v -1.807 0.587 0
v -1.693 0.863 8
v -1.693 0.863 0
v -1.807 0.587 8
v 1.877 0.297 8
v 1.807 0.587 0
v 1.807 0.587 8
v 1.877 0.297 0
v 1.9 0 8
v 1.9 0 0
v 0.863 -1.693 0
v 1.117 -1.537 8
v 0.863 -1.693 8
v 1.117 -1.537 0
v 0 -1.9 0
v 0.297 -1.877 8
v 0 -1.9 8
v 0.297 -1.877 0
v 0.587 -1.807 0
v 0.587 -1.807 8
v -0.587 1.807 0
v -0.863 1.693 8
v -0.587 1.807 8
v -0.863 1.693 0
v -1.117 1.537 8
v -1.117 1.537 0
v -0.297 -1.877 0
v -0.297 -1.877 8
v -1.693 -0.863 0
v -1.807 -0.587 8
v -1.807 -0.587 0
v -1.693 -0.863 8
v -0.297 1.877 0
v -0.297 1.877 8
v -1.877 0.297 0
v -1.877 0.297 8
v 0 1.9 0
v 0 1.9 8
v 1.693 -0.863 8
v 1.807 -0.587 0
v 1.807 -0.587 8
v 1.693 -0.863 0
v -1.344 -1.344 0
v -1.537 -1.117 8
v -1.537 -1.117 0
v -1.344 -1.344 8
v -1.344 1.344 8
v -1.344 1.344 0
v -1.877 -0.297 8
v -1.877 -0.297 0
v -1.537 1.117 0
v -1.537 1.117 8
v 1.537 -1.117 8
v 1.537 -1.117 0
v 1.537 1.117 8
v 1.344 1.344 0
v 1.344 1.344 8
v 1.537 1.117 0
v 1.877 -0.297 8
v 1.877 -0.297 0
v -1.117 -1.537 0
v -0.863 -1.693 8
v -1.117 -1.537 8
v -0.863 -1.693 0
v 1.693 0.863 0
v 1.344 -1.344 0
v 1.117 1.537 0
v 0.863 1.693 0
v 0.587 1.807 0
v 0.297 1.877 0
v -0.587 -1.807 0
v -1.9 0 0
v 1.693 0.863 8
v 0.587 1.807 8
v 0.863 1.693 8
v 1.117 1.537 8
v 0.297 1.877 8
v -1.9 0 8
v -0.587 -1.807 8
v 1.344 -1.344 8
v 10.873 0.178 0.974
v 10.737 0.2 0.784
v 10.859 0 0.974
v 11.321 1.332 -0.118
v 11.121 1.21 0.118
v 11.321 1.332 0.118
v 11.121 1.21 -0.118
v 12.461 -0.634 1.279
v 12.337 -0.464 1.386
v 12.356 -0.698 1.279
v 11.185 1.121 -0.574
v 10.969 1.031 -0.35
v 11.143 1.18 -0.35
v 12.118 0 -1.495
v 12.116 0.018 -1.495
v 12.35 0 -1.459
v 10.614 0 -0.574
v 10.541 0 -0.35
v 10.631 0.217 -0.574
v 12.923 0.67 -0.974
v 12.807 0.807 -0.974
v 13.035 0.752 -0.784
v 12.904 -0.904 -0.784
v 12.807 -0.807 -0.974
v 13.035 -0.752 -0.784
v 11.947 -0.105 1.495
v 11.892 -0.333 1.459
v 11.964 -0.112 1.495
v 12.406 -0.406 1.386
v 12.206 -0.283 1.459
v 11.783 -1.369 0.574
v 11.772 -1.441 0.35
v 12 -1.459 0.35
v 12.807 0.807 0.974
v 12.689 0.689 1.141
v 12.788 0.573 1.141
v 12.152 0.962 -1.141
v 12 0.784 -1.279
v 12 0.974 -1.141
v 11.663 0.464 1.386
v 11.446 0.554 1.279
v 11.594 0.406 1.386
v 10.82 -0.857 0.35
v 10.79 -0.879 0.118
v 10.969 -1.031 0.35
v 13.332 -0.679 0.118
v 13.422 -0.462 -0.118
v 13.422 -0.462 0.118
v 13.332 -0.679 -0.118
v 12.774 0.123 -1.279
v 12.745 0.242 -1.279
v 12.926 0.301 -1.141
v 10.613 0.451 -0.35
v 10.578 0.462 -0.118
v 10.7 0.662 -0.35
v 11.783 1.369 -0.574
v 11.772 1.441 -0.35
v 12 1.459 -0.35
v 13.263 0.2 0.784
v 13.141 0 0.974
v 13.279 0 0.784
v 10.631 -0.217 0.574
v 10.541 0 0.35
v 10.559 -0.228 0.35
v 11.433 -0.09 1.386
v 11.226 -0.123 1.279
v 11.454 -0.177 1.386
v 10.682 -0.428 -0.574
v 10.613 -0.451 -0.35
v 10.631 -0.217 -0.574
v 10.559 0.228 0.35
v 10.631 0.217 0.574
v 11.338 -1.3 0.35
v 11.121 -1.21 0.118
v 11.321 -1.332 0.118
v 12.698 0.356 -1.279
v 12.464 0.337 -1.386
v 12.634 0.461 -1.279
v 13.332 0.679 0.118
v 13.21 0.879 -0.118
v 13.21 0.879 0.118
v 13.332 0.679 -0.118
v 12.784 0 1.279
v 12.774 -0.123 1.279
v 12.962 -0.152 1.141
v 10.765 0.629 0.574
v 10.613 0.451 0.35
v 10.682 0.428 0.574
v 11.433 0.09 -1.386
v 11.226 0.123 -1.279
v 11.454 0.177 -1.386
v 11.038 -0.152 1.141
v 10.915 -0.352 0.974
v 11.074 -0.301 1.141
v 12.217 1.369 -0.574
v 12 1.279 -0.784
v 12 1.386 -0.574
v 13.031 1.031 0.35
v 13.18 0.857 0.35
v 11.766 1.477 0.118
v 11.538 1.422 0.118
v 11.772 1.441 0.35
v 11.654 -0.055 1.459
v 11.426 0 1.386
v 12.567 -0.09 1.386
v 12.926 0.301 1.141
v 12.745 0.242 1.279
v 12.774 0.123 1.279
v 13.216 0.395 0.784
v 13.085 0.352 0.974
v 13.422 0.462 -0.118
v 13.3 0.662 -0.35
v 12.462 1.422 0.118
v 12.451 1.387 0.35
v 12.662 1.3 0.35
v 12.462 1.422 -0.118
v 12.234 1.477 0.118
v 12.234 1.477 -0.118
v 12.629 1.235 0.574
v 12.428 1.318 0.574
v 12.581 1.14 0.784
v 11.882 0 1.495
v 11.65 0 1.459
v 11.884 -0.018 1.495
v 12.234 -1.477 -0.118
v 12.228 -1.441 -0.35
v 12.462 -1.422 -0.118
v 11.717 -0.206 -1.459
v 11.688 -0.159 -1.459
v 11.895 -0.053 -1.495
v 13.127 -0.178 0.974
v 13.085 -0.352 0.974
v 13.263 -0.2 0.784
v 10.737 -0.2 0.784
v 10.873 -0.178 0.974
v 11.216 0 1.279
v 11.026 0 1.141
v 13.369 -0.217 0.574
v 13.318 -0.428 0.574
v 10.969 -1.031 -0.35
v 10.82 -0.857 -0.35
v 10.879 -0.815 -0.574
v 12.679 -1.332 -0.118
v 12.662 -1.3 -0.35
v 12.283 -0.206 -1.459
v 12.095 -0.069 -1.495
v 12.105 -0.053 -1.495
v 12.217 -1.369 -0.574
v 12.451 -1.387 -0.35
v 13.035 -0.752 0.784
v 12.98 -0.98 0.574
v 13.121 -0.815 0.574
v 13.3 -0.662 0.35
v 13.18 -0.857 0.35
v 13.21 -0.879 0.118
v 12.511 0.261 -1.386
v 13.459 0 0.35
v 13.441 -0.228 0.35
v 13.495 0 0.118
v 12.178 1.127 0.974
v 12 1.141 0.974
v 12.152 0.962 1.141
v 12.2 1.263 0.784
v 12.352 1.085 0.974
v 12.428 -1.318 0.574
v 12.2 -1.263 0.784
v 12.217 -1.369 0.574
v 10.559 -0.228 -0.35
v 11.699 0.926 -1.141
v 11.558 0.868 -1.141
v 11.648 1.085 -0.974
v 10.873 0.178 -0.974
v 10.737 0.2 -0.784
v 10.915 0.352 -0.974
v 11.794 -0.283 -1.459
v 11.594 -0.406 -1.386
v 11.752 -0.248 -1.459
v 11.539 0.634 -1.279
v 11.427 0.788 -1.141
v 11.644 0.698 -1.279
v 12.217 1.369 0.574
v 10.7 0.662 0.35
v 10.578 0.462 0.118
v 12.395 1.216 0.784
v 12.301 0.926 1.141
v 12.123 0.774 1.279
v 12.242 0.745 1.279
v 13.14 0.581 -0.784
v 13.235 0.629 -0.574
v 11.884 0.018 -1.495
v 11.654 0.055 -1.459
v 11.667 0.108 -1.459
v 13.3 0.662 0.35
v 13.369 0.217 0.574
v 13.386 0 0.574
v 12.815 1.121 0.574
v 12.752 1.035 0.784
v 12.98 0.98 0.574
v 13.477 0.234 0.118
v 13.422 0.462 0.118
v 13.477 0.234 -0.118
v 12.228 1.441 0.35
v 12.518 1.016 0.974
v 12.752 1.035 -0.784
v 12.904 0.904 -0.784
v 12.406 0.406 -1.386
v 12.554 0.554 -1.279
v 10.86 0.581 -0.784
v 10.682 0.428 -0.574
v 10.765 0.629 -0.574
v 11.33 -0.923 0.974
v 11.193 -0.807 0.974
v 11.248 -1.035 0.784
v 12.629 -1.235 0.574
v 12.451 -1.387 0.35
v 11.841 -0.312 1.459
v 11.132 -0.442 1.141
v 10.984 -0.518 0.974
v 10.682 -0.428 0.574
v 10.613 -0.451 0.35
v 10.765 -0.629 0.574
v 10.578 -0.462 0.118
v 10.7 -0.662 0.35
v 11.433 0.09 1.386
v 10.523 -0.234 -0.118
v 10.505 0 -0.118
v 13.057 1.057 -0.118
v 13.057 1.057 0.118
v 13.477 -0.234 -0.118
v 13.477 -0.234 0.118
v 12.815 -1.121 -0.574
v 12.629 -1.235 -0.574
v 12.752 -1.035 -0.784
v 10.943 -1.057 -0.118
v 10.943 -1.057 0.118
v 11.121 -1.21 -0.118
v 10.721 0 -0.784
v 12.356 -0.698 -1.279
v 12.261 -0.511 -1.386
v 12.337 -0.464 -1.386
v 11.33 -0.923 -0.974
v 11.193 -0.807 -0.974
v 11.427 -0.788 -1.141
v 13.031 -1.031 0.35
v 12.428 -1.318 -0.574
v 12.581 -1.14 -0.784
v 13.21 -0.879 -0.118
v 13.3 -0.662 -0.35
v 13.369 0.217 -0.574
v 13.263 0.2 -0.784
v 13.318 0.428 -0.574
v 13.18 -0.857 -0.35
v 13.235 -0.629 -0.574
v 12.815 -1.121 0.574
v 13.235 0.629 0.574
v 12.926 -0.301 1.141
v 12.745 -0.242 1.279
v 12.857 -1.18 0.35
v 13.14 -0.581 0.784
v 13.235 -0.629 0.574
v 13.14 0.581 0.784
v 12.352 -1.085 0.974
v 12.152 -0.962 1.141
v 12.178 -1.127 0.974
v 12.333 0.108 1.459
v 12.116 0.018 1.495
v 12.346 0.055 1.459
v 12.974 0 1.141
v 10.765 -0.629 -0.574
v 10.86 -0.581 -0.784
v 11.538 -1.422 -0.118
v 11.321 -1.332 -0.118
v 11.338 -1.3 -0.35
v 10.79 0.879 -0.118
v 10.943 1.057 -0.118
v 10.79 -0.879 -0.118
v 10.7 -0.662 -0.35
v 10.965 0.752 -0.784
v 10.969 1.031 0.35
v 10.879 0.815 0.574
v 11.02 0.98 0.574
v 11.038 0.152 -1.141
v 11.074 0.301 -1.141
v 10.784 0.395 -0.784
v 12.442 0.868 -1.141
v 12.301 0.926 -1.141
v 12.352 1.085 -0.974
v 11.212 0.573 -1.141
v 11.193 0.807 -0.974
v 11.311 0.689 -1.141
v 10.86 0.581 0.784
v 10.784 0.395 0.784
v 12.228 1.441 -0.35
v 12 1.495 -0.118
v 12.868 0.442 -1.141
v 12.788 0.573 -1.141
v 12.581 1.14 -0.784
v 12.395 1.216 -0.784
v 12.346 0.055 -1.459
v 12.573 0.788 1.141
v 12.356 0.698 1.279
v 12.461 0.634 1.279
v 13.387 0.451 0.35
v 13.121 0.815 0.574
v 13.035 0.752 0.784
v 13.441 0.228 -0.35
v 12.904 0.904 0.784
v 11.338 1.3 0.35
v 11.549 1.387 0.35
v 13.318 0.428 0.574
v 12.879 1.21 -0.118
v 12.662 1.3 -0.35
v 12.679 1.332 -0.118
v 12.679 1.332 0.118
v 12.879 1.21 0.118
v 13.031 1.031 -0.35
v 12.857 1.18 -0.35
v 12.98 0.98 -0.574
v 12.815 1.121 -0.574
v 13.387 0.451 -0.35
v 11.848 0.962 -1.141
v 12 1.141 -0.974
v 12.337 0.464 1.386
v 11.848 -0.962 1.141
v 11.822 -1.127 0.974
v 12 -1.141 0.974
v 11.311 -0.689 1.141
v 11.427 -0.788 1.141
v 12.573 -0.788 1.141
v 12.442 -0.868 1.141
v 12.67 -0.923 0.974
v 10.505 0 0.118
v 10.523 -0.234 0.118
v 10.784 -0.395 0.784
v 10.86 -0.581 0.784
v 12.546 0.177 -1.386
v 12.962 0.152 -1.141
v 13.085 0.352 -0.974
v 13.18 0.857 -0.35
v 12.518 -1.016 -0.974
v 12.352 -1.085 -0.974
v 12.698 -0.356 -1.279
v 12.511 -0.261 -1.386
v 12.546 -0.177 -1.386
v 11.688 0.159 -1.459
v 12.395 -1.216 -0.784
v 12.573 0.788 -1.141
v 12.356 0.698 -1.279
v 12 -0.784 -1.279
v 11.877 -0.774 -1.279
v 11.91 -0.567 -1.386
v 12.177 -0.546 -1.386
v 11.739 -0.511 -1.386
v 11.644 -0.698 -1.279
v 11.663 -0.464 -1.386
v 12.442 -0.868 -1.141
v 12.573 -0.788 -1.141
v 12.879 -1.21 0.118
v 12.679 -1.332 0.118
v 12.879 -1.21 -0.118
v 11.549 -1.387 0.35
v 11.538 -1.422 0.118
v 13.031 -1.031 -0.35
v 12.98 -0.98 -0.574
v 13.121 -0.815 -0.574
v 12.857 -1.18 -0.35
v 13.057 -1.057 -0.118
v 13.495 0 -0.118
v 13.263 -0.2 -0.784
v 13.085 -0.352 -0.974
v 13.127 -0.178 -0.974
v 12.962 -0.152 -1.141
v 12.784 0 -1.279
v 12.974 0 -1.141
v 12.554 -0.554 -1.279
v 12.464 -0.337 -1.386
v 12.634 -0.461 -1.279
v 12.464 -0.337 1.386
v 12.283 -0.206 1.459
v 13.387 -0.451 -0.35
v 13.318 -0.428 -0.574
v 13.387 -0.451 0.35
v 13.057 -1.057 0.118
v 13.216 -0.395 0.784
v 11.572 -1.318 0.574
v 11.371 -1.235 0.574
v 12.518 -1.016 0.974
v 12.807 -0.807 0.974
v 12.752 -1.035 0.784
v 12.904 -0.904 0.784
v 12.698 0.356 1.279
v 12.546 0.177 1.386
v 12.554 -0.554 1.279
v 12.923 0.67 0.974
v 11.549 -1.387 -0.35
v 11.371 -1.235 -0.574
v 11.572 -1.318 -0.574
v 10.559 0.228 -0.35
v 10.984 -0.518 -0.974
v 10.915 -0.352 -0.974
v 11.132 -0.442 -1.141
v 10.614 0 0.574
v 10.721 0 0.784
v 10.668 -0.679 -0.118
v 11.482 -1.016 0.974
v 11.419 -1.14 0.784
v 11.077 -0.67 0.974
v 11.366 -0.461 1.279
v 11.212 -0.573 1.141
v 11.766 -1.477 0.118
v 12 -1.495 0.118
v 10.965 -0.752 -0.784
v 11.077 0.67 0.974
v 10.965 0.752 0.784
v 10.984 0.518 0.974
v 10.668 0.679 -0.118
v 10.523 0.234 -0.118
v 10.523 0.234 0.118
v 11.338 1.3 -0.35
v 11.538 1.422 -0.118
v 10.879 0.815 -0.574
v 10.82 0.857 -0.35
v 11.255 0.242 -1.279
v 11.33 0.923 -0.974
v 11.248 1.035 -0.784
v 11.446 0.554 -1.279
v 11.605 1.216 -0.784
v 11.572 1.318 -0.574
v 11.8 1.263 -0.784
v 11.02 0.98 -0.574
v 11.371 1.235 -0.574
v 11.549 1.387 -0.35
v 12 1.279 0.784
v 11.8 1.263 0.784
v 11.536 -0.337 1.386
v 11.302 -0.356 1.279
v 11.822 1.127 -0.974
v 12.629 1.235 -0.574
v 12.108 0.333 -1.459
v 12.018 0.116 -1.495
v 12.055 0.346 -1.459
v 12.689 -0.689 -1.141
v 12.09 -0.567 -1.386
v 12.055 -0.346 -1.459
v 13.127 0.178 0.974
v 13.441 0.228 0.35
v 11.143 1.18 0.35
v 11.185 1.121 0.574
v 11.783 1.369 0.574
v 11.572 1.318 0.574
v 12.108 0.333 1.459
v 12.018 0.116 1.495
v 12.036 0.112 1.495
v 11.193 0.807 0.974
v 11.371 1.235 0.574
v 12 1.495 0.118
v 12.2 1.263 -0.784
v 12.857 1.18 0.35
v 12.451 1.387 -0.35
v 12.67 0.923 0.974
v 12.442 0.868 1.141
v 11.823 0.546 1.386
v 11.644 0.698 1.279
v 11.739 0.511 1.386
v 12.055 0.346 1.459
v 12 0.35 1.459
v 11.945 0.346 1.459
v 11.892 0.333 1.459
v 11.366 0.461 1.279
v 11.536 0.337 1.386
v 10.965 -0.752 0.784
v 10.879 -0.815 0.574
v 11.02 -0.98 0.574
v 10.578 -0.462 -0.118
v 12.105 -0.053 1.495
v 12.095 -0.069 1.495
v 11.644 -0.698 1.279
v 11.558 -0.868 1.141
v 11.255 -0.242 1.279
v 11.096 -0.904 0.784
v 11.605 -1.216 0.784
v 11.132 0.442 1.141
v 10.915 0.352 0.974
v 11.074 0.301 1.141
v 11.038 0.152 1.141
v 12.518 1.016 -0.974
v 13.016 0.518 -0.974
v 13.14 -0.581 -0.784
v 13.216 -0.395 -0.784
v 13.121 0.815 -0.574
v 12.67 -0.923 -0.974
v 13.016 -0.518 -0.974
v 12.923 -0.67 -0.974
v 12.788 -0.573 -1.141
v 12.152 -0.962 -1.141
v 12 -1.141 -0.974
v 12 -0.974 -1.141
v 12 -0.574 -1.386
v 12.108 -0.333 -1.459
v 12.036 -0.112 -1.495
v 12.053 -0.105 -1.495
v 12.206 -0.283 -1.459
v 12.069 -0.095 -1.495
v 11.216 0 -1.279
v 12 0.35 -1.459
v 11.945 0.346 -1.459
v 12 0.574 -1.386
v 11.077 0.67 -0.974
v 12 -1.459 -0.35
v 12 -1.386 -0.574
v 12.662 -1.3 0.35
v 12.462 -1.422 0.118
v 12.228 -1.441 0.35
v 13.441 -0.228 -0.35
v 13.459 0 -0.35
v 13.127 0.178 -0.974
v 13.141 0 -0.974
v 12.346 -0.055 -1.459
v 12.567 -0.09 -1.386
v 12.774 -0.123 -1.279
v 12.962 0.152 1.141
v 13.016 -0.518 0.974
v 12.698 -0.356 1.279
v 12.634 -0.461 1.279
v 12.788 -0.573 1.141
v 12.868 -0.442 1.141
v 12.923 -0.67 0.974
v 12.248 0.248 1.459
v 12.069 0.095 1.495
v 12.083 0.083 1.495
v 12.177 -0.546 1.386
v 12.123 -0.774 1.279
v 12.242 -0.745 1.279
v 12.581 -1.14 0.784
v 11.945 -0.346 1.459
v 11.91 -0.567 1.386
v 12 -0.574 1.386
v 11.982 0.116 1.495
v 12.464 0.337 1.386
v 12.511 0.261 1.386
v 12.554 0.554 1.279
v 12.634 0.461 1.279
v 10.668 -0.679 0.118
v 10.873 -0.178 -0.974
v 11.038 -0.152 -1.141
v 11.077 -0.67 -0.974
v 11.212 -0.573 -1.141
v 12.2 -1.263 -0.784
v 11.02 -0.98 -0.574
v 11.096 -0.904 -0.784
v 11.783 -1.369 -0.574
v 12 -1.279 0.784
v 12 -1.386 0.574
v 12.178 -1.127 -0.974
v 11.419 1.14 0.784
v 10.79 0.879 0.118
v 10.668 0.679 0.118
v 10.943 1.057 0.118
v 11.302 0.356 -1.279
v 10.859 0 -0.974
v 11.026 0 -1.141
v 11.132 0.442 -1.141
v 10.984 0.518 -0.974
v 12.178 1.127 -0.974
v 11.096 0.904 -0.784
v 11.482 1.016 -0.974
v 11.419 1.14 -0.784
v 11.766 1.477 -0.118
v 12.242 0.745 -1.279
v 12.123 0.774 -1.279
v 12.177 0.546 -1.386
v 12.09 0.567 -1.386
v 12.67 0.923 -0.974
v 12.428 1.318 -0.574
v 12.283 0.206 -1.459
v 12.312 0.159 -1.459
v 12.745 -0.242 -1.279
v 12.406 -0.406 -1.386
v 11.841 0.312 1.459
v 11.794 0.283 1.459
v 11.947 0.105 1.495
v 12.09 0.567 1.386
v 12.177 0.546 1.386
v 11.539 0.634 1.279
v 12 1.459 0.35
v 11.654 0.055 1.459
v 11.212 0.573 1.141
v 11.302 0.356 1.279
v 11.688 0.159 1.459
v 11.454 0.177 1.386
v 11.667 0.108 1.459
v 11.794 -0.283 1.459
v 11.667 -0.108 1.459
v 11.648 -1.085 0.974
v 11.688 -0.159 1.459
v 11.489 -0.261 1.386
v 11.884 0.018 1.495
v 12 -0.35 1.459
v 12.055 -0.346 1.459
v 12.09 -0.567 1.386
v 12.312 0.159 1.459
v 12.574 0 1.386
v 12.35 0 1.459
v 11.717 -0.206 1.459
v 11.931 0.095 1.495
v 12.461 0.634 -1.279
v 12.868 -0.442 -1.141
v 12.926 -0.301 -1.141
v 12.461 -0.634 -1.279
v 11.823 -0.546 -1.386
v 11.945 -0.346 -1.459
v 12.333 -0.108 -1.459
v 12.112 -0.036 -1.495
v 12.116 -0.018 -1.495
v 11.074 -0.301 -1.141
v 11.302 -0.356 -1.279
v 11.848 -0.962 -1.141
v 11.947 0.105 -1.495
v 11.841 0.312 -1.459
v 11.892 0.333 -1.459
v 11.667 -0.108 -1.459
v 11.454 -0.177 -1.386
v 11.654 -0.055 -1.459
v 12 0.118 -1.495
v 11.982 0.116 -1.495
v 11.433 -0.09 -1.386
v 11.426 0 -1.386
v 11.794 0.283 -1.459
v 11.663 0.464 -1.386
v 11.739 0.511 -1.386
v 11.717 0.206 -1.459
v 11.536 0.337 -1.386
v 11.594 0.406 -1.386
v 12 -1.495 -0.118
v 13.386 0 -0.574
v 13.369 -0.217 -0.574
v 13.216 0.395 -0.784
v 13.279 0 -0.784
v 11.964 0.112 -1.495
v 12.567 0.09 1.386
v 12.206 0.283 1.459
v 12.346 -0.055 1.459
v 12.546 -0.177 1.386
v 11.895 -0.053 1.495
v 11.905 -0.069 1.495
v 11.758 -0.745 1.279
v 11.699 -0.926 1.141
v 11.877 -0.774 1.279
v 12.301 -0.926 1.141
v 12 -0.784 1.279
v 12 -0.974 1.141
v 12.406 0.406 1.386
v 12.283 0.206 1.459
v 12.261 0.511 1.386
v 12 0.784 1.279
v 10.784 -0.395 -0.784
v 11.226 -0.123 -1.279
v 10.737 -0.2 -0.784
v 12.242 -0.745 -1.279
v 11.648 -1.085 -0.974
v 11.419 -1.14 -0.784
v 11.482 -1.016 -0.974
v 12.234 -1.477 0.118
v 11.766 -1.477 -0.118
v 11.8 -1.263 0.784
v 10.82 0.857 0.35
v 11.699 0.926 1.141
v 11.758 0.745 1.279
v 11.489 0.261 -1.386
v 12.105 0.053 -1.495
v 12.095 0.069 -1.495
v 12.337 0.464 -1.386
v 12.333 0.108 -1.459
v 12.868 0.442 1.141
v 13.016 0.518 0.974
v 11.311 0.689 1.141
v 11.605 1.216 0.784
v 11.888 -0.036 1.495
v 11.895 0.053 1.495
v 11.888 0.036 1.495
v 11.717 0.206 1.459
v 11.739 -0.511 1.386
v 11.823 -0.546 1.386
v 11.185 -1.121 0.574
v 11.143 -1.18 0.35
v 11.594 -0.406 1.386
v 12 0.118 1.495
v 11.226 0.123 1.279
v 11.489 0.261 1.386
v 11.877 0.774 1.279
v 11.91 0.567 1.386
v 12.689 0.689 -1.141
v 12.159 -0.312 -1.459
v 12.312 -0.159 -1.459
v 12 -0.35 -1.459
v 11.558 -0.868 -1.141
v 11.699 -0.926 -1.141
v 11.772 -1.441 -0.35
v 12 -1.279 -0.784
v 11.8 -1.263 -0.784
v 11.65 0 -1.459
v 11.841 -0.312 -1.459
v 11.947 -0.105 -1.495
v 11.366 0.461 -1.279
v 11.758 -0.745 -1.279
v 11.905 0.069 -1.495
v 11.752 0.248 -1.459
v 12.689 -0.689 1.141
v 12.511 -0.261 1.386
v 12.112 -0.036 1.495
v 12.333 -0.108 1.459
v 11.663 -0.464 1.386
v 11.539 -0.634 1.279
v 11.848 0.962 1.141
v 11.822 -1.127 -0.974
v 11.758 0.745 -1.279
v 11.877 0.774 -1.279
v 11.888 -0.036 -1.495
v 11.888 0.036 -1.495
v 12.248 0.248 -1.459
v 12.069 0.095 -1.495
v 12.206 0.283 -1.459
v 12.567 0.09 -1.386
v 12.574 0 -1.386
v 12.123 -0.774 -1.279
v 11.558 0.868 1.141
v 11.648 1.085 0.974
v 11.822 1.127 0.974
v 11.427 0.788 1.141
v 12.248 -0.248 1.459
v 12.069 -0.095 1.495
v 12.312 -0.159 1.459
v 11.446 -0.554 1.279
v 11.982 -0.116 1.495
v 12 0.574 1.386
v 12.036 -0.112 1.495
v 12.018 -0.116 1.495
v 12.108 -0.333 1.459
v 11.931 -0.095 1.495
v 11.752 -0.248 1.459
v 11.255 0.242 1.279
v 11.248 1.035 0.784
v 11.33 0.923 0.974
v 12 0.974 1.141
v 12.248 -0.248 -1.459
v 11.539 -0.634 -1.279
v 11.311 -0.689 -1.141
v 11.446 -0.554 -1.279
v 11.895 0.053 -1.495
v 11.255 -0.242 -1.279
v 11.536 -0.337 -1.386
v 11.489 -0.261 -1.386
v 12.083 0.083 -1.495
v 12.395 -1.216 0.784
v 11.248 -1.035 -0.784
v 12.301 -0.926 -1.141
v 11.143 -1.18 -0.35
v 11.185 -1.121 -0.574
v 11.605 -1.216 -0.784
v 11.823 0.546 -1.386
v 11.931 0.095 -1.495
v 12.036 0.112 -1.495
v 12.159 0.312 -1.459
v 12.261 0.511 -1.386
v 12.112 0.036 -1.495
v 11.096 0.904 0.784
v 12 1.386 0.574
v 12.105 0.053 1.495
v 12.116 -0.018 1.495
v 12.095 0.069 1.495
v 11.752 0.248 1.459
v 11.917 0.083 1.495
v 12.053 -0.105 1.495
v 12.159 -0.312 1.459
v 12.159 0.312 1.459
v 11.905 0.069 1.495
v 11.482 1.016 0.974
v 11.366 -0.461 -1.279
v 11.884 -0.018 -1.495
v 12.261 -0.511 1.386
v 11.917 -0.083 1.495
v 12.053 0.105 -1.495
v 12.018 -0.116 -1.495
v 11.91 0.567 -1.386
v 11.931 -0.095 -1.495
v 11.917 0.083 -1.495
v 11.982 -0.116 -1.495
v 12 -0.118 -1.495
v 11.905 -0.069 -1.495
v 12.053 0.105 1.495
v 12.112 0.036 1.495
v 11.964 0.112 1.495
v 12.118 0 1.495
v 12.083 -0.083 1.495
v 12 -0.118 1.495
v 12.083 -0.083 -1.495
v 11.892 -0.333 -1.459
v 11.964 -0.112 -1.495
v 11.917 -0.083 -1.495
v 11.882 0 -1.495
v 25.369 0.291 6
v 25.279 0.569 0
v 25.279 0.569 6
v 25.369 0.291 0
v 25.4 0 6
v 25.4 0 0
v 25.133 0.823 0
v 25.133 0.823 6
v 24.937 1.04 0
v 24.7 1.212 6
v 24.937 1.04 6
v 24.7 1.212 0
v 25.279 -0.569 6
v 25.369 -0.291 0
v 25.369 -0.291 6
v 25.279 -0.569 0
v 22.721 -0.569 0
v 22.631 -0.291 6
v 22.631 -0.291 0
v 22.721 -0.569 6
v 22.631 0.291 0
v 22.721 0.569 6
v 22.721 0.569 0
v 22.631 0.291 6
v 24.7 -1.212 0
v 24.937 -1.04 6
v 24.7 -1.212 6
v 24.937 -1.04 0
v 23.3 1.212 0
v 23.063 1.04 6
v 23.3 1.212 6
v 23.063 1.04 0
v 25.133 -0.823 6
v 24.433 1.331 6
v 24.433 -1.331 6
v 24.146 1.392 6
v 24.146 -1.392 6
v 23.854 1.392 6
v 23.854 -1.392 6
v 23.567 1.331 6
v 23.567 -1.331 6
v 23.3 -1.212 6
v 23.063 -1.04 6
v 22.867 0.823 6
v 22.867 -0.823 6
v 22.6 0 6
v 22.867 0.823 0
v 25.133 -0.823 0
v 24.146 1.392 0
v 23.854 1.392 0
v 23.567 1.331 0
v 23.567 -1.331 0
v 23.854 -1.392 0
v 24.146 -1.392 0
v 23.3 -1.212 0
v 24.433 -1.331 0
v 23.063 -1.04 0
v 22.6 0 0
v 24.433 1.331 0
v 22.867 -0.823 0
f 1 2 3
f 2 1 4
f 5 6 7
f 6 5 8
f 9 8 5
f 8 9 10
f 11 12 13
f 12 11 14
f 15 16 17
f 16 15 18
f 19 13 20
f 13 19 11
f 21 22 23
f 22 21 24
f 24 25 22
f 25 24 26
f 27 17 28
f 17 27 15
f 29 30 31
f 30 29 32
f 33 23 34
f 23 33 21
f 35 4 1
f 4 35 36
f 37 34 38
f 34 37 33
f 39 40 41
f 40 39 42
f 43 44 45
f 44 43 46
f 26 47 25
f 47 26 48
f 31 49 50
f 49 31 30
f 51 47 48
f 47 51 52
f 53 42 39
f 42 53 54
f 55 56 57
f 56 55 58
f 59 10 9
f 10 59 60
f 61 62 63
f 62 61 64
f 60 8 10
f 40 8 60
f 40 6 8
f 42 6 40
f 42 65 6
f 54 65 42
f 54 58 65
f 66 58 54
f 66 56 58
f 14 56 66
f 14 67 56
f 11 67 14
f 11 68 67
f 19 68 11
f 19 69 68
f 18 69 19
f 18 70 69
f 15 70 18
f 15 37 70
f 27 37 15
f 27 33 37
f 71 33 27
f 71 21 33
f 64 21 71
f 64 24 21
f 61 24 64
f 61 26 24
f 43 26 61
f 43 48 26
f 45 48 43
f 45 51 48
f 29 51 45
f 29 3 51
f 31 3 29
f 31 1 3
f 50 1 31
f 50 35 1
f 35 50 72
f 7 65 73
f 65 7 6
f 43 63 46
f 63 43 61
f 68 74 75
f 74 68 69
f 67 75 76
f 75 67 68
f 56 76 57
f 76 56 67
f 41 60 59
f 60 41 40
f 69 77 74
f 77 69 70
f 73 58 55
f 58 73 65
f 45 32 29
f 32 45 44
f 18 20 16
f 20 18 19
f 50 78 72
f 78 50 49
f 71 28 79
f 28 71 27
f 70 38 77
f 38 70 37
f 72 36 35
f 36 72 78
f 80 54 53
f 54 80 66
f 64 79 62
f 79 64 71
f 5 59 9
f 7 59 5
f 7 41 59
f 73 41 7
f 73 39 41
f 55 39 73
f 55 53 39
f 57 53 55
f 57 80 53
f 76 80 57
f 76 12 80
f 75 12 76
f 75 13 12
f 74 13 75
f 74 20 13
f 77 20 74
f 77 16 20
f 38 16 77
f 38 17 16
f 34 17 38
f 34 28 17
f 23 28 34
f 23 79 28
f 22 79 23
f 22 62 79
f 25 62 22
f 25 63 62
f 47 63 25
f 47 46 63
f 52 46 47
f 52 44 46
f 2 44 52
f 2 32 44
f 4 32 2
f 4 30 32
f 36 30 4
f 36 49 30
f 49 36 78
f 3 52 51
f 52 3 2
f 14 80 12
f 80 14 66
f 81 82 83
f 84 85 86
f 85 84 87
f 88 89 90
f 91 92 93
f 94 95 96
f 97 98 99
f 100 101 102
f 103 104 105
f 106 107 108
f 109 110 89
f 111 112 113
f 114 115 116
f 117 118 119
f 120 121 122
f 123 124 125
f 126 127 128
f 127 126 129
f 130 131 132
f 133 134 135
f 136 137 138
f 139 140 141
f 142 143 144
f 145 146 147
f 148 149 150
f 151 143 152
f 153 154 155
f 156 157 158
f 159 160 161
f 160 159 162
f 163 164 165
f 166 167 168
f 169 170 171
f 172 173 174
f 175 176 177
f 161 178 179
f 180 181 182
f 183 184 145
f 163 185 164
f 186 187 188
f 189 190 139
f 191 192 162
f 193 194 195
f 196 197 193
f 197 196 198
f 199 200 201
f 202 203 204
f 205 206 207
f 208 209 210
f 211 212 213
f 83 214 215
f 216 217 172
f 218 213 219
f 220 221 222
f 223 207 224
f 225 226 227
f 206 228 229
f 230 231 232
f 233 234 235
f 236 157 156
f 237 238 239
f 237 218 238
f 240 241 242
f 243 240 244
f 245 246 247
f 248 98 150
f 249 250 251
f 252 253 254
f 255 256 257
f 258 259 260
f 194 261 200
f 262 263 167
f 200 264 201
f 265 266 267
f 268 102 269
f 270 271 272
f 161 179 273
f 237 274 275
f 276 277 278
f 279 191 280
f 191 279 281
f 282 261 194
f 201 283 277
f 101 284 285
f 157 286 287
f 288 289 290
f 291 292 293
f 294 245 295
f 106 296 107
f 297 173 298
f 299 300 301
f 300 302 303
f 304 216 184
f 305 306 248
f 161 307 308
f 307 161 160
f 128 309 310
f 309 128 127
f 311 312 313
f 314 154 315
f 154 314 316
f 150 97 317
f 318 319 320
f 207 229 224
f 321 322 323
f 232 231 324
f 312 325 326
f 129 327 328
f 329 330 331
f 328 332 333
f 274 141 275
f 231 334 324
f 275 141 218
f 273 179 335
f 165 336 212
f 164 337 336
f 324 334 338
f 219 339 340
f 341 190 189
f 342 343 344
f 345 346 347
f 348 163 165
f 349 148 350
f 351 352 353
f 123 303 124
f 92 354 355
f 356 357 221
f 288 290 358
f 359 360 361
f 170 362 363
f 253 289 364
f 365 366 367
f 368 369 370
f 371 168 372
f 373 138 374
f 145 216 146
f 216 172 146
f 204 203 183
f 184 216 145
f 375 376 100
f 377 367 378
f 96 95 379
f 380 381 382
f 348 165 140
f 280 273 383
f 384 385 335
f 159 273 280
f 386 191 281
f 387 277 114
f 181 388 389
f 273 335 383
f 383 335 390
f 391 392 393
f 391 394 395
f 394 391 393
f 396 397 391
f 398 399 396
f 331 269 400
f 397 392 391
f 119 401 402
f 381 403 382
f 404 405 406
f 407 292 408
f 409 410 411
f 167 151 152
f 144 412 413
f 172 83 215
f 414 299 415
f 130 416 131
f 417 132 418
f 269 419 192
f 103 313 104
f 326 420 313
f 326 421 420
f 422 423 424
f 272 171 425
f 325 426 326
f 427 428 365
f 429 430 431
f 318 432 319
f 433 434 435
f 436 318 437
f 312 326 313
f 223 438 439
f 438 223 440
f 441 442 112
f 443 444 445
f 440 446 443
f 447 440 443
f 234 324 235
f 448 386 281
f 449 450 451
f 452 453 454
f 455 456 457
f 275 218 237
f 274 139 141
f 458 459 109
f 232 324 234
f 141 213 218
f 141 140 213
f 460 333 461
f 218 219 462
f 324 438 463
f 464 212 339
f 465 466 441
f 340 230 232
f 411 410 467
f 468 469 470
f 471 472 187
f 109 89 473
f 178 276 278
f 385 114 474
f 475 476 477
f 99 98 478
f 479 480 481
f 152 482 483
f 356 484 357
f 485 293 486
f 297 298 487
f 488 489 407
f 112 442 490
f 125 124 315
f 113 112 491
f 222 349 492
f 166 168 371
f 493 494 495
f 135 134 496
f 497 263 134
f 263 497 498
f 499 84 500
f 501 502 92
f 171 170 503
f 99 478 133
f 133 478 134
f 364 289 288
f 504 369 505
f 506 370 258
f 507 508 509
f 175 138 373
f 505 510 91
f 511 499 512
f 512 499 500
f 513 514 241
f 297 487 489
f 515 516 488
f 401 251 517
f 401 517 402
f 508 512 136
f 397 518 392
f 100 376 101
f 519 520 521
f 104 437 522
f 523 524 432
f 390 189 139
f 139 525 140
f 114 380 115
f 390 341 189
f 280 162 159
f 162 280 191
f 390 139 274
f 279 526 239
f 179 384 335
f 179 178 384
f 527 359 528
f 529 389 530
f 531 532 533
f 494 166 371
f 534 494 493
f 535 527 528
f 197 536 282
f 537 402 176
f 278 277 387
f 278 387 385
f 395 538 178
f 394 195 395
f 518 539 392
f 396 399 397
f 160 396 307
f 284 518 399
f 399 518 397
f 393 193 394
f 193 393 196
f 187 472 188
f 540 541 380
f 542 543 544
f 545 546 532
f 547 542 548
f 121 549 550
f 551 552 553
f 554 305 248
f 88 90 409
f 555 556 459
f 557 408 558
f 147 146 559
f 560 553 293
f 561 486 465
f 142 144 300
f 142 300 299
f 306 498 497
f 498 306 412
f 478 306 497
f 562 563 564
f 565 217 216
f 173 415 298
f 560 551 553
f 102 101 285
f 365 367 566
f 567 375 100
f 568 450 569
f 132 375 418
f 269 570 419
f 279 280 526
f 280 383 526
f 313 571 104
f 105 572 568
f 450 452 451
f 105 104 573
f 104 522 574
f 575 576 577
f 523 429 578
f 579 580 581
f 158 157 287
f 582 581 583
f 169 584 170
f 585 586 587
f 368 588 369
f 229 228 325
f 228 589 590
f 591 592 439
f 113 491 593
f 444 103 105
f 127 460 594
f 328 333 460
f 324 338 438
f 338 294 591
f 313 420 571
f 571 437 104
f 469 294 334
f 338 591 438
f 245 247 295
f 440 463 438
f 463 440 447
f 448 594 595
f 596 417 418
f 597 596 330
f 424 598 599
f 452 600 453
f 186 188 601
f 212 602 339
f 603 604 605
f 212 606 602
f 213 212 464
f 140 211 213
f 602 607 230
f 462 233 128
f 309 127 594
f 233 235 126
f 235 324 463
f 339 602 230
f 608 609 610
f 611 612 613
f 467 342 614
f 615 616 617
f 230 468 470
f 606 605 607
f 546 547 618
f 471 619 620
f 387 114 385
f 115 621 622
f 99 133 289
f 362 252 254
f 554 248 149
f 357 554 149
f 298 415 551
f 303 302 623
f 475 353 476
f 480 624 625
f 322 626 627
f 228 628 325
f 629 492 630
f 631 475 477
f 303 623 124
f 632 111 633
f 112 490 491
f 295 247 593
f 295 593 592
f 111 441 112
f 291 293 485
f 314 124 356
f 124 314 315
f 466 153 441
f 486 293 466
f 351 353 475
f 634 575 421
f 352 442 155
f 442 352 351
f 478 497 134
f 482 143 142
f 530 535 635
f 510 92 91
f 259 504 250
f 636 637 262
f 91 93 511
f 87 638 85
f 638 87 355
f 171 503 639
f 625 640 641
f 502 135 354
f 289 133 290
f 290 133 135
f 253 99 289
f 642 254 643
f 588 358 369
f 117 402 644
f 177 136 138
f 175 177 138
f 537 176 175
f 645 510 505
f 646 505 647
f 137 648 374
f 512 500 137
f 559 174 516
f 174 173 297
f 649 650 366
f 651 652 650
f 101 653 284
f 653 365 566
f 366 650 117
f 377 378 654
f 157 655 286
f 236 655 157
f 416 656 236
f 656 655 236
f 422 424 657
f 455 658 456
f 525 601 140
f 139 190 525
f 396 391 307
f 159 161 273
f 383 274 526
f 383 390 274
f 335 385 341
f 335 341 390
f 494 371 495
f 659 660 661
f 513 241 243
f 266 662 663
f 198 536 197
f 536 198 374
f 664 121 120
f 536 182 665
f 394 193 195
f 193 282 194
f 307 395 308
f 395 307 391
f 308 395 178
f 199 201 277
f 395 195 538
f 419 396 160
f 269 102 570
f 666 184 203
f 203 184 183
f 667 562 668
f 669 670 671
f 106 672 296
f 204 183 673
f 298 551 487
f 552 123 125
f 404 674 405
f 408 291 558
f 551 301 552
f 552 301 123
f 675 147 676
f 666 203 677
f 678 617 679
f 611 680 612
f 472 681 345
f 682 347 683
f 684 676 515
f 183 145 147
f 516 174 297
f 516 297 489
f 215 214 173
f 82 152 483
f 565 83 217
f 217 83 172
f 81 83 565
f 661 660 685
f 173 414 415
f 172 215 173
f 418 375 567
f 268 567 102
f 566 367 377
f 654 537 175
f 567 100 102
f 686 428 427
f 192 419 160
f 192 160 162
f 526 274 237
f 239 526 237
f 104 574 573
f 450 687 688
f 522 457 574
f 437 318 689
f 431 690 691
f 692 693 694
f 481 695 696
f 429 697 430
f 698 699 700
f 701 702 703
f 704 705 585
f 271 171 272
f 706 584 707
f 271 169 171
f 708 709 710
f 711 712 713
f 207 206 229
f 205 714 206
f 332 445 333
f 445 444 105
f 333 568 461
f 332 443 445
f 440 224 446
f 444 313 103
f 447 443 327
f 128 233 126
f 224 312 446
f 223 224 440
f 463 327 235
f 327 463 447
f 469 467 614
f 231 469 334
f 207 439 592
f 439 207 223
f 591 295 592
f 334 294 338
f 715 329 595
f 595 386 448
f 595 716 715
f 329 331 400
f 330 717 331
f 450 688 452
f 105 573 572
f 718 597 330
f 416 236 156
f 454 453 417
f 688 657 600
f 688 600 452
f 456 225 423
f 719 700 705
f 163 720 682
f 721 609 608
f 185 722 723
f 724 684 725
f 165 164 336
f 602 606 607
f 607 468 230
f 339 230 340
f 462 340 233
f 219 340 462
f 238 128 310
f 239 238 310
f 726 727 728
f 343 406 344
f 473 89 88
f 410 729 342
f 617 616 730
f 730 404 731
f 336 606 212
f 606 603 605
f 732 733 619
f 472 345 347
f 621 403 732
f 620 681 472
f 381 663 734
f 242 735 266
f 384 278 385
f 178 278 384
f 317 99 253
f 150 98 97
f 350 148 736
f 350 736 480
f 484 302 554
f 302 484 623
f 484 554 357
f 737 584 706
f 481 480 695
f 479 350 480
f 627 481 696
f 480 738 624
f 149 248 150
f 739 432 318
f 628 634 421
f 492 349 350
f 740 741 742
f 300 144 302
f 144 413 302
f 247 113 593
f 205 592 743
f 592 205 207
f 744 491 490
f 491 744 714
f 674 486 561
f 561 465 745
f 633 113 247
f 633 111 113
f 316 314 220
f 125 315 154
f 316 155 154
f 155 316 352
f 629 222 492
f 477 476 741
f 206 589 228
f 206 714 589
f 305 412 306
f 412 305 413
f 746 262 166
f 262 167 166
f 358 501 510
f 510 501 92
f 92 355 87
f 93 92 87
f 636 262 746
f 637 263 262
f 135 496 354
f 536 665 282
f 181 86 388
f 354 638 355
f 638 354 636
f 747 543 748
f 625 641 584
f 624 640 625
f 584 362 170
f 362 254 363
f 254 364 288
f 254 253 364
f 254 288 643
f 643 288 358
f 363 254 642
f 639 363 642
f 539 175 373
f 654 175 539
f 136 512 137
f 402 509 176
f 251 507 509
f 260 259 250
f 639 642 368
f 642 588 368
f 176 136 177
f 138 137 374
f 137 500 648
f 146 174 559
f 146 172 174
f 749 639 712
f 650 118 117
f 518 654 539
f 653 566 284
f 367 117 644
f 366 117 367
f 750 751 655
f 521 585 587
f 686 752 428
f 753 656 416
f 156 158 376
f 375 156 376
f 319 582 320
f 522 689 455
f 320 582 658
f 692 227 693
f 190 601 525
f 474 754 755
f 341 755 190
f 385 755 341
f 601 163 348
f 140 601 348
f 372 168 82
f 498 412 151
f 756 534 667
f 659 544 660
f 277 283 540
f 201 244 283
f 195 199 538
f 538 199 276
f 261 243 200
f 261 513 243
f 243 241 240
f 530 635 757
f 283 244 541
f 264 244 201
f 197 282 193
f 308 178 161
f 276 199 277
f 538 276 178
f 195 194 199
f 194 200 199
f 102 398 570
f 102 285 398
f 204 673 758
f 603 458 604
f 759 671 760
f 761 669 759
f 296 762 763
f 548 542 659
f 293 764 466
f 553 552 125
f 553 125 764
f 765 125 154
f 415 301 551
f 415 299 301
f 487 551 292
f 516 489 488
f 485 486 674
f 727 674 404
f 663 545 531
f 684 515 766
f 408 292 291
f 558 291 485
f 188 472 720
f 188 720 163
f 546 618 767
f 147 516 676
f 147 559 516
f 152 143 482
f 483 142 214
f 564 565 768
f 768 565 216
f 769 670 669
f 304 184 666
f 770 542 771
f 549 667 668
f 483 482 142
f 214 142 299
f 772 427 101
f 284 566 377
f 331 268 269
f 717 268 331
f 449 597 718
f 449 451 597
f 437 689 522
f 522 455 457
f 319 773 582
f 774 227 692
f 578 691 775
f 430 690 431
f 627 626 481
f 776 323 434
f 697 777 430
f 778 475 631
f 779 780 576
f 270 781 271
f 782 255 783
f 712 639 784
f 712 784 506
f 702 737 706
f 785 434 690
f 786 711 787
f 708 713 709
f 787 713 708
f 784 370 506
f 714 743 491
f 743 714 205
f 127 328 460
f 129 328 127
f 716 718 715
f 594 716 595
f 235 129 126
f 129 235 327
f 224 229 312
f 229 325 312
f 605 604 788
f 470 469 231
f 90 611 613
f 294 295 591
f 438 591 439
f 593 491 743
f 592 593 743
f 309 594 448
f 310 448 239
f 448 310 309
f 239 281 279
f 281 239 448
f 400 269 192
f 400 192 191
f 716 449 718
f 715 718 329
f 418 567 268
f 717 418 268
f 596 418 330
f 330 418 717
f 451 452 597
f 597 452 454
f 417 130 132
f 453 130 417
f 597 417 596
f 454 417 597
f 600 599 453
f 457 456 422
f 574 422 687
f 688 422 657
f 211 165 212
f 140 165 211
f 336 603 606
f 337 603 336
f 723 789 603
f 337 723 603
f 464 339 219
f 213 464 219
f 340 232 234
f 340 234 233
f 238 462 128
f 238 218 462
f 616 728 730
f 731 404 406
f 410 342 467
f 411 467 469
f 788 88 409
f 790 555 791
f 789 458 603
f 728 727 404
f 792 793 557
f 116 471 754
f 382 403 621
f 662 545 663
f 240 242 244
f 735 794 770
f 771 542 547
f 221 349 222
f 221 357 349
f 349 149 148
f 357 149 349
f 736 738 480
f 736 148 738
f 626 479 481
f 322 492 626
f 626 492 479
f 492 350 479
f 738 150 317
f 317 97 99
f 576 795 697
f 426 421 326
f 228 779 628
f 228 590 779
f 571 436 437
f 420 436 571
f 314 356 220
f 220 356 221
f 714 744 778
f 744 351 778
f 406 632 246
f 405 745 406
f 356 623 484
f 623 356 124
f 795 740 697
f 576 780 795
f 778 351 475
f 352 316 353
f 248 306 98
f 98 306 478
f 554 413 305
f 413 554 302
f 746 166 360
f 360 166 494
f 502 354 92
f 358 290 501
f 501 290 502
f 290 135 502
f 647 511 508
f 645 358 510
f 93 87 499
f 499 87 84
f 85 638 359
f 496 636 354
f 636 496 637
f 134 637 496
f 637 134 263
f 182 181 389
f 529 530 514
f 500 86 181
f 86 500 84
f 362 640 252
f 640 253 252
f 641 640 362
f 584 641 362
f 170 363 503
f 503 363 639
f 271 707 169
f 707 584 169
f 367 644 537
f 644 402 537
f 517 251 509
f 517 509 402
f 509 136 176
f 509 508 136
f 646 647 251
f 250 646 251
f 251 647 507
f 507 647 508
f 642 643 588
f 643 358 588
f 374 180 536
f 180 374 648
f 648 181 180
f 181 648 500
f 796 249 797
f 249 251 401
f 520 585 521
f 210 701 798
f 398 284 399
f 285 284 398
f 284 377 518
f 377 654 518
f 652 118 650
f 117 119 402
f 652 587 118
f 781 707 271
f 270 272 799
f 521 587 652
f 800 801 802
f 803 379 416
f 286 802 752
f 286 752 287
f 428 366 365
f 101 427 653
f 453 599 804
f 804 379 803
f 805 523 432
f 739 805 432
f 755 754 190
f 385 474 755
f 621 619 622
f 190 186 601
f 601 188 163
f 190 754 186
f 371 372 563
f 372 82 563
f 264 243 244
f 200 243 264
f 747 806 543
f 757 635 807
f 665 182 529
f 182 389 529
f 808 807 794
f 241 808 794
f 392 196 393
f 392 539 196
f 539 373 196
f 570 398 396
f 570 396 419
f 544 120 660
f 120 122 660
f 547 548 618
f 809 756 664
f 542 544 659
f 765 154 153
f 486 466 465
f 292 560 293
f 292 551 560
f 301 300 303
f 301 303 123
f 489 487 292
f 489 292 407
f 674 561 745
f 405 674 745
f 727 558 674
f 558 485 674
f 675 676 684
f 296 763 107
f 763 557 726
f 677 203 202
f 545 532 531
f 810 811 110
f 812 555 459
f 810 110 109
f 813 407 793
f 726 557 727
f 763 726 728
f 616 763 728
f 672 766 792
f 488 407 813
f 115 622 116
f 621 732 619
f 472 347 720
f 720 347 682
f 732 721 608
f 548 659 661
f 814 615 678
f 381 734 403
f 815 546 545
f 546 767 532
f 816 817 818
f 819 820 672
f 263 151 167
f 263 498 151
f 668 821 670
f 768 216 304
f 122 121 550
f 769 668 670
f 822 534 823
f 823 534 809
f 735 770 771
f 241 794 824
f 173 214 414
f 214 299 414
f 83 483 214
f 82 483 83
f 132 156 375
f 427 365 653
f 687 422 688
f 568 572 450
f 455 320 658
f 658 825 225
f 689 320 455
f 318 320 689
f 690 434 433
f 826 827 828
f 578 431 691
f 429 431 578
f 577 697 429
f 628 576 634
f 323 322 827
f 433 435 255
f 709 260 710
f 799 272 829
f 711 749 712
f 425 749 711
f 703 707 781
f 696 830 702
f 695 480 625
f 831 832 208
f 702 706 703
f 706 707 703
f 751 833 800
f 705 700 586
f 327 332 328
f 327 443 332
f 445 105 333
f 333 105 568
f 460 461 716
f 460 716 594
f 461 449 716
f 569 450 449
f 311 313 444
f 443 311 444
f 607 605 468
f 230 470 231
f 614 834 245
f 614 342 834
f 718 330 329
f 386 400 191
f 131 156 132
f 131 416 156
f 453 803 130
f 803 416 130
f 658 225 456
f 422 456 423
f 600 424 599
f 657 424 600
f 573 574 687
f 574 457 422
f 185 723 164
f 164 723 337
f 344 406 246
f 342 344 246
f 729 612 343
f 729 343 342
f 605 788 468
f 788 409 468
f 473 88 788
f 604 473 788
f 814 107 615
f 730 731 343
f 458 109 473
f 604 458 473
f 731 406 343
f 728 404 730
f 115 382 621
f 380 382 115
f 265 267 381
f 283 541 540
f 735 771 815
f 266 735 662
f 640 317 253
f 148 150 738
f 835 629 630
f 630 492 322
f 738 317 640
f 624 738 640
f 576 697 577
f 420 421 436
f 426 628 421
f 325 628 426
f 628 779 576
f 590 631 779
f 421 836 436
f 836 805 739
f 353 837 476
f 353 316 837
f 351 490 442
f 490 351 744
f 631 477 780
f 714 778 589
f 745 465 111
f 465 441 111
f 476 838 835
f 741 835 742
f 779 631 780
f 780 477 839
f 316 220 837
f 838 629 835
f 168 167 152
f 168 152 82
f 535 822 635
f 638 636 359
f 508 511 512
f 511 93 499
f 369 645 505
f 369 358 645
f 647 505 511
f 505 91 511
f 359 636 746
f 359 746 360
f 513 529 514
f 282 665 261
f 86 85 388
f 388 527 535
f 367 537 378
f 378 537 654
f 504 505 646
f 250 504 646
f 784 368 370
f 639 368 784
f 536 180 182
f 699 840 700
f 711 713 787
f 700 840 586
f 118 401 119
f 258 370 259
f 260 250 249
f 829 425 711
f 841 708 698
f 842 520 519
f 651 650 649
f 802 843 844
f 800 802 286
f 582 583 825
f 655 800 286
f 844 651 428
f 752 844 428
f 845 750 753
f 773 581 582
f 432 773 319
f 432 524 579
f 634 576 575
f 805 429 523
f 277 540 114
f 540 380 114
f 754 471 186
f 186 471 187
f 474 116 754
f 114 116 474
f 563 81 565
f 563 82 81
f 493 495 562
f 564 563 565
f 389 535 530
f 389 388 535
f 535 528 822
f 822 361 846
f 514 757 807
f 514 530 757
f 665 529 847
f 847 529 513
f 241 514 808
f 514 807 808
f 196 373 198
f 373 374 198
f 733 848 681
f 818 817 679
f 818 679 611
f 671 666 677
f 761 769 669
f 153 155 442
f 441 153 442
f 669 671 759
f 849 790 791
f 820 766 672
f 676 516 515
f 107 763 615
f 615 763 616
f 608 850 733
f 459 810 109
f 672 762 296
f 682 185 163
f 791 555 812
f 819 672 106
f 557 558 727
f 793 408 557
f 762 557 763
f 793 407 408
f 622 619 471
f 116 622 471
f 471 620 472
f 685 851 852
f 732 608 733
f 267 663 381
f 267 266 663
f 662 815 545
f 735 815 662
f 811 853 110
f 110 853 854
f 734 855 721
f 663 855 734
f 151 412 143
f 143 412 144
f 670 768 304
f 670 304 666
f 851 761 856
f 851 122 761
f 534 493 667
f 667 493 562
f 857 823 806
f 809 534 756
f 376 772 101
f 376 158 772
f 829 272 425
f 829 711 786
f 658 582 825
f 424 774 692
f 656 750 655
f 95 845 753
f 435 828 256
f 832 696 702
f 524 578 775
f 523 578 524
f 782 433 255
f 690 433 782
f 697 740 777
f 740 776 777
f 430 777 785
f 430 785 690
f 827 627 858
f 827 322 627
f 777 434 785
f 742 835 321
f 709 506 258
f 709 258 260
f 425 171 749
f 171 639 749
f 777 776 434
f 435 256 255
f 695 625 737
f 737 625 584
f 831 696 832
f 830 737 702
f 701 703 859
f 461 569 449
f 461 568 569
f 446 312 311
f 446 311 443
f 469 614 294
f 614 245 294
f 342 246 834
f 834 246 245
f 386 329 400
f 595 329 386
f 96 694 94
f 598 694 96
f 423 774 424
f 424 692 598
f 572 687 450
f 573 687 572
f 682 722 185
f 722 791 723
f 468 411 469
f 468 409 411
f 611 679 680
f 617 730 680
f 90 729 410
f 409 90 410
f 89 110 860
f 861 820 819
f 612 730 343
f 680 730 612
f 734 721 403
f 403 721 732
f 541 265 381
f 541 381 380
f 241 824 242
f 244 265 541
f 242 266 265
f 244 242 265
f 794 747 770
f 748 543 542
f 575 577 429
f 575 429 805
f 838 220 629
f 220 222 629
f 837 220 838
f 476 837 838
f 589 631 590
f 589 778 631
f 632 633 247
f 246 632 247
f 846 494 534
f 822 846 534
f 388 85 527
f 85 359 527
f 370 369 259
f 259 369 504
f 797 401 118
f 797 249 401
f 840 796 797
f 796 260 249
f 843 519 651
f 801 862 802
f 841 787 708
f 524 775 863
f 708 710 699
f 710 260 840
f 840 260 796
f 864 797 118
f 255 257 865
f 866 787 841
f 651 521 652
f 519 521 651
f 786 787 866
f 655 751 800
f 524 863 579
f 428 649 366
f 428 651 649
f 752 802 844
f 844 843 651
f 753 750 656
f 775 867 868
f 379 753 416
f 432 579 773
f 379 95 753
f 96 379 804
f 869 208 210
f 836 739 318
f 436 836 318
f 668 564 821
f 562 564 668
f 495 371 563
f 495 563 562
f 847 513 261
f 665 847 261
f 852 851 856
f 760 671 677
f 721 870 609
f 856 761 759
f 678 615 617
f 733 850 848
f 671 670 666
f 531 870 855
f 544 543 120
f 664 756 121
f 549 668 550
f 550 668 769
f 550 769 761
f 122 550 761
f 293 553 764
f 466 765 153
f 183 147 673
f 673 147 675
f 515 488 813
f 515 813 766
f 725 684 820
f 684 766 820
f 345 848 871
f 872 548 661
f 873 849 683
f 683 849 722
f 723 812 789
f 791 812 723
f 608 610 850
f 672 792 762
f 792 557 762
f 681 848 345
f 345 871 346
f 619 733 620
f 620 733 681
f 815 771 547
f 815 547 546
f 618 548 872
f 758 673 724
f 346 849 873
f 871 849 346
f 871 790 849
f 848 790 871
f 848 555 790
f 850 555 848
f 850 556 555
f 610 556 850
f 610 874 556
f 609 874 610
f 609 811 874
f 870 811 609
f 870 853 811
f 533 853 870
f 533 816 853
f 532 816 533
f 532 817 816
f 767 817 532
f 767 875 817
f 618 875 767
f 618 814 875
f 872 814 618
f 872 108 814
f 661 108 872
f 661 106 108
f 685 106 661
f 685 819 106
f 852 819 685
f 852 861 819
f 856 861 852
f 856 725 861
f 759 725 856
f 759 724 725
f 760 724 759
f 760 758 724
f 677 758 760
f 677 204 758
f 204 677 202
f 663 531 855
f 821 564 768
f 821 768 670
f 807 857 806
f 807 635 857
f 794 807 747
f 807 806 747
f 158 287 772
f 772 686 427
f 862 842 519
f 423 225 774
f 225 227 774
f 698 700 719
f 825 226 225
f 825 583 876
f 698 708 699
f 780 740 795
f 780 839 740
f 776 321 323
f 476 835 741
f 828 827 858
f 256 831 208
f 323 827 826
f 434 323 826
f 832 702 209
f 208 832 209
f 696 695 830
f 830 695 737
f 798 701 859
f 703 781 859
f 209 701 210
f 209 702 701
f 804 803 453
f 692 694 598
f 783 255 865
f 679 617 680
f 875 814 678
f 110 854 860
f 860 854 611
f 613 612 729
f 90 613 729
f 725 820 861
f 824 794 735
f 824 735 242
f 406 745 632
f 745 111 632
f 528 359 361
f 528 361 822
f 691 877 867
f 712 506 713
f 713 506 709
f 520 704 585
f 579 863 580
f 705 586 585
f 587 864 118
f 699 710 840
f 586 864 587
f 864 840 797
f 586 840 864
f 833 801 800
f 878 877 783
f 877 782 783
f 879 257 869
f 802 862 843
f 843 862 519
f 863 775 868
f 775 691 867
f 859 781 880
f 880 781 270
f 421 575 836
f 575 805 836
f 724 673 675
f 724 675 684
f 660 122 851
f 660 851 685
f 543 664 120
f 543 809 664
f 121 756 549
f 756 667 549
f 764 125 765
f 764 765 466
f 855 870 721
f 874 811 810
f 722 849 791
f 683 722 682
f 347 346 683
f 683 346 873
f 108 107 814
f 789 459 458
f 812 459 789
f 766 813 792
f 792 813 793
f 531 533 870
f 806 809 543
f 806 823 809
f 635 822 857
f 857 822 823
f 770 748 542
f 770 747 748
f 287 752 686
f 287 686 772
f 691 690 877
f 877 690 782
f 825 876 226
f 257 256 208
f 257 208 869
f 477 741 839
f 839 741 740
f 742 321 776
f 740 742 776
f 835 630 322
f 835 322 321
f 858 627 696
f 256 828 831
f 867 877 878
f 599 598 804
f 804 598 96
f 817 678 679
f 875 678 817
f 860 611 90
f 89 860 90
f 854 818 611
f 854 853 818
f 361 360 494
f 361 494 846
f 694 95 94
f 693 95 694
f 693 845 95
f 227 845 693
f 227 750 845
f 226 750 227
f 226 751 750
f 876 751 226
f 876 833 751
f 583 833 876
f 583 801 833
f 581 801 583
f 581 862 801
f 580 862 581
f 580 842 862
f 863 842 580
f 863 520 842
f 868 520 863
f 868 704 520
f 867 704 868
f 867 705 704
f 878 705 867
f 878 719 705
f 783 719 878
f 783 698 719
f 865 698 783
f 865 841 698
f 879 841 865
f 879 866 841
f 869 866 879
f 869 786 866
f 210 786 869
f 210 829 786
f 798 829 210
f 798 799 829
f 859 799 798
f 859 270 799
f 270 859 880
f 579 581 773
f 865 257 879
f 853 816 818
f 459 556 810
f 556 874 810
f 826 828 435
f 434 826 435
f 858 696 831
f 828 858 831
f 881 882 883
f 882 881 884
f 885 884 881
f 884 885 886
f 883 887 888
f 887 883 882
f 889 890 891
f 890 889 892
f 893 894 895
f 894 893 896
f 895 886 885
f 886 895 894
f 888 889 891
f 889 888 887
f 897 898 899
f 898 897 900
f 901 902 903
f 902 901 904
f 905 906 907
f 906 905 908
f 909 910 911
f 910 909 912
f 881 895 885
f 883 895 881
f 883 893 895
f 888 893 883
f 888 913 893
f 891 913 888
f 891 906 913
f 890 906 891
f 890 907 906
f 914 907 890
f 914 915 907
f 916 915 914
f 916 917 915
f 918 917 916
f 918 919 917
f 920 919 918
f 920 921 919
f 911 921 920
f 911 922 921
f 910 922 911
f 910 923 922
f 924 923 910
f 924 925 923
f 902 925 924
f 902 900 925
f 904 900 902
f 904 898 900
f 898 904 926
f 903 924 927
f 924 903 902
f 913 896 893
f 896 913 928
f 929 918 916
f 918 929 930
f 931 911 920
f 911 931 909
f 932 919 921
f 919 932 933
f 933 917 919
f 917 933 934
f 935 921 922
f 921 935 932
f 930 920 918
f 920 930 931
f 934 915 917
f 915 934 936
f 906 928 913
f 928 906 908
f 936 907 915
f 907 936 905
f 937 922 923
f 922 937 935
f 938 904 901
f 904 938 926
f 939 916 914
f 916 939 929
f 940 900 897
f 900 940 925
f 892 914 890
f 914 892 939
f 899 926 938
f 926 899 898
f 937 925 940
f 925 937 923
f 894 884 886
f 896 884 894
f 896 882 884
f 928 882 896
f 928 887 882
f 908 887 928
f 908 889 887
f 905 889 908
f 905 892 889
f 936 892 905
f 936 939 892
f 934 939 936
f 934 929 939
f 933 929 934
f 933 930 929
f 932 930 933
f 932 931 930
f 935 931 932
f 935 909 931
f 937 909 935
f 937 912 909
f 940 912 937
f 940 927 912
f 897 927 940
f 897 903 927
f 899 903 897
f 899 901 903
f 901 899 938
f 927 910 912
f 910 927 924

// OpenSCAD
// TAYLKOMB corrected lock stack visual (attachment side)
button_d = 3.8;
ball_d = 3.0;
spring_len = 6.0;
translate([0,0,0]) cylinder(h=8, r=button_d/2, $fn=40);
translate([12,0,0]) sphere(r=ball_d/2, $fn=40);
translate([24,0,0]) cylinder(h=spring_len, r=1.4, $fn=30);
